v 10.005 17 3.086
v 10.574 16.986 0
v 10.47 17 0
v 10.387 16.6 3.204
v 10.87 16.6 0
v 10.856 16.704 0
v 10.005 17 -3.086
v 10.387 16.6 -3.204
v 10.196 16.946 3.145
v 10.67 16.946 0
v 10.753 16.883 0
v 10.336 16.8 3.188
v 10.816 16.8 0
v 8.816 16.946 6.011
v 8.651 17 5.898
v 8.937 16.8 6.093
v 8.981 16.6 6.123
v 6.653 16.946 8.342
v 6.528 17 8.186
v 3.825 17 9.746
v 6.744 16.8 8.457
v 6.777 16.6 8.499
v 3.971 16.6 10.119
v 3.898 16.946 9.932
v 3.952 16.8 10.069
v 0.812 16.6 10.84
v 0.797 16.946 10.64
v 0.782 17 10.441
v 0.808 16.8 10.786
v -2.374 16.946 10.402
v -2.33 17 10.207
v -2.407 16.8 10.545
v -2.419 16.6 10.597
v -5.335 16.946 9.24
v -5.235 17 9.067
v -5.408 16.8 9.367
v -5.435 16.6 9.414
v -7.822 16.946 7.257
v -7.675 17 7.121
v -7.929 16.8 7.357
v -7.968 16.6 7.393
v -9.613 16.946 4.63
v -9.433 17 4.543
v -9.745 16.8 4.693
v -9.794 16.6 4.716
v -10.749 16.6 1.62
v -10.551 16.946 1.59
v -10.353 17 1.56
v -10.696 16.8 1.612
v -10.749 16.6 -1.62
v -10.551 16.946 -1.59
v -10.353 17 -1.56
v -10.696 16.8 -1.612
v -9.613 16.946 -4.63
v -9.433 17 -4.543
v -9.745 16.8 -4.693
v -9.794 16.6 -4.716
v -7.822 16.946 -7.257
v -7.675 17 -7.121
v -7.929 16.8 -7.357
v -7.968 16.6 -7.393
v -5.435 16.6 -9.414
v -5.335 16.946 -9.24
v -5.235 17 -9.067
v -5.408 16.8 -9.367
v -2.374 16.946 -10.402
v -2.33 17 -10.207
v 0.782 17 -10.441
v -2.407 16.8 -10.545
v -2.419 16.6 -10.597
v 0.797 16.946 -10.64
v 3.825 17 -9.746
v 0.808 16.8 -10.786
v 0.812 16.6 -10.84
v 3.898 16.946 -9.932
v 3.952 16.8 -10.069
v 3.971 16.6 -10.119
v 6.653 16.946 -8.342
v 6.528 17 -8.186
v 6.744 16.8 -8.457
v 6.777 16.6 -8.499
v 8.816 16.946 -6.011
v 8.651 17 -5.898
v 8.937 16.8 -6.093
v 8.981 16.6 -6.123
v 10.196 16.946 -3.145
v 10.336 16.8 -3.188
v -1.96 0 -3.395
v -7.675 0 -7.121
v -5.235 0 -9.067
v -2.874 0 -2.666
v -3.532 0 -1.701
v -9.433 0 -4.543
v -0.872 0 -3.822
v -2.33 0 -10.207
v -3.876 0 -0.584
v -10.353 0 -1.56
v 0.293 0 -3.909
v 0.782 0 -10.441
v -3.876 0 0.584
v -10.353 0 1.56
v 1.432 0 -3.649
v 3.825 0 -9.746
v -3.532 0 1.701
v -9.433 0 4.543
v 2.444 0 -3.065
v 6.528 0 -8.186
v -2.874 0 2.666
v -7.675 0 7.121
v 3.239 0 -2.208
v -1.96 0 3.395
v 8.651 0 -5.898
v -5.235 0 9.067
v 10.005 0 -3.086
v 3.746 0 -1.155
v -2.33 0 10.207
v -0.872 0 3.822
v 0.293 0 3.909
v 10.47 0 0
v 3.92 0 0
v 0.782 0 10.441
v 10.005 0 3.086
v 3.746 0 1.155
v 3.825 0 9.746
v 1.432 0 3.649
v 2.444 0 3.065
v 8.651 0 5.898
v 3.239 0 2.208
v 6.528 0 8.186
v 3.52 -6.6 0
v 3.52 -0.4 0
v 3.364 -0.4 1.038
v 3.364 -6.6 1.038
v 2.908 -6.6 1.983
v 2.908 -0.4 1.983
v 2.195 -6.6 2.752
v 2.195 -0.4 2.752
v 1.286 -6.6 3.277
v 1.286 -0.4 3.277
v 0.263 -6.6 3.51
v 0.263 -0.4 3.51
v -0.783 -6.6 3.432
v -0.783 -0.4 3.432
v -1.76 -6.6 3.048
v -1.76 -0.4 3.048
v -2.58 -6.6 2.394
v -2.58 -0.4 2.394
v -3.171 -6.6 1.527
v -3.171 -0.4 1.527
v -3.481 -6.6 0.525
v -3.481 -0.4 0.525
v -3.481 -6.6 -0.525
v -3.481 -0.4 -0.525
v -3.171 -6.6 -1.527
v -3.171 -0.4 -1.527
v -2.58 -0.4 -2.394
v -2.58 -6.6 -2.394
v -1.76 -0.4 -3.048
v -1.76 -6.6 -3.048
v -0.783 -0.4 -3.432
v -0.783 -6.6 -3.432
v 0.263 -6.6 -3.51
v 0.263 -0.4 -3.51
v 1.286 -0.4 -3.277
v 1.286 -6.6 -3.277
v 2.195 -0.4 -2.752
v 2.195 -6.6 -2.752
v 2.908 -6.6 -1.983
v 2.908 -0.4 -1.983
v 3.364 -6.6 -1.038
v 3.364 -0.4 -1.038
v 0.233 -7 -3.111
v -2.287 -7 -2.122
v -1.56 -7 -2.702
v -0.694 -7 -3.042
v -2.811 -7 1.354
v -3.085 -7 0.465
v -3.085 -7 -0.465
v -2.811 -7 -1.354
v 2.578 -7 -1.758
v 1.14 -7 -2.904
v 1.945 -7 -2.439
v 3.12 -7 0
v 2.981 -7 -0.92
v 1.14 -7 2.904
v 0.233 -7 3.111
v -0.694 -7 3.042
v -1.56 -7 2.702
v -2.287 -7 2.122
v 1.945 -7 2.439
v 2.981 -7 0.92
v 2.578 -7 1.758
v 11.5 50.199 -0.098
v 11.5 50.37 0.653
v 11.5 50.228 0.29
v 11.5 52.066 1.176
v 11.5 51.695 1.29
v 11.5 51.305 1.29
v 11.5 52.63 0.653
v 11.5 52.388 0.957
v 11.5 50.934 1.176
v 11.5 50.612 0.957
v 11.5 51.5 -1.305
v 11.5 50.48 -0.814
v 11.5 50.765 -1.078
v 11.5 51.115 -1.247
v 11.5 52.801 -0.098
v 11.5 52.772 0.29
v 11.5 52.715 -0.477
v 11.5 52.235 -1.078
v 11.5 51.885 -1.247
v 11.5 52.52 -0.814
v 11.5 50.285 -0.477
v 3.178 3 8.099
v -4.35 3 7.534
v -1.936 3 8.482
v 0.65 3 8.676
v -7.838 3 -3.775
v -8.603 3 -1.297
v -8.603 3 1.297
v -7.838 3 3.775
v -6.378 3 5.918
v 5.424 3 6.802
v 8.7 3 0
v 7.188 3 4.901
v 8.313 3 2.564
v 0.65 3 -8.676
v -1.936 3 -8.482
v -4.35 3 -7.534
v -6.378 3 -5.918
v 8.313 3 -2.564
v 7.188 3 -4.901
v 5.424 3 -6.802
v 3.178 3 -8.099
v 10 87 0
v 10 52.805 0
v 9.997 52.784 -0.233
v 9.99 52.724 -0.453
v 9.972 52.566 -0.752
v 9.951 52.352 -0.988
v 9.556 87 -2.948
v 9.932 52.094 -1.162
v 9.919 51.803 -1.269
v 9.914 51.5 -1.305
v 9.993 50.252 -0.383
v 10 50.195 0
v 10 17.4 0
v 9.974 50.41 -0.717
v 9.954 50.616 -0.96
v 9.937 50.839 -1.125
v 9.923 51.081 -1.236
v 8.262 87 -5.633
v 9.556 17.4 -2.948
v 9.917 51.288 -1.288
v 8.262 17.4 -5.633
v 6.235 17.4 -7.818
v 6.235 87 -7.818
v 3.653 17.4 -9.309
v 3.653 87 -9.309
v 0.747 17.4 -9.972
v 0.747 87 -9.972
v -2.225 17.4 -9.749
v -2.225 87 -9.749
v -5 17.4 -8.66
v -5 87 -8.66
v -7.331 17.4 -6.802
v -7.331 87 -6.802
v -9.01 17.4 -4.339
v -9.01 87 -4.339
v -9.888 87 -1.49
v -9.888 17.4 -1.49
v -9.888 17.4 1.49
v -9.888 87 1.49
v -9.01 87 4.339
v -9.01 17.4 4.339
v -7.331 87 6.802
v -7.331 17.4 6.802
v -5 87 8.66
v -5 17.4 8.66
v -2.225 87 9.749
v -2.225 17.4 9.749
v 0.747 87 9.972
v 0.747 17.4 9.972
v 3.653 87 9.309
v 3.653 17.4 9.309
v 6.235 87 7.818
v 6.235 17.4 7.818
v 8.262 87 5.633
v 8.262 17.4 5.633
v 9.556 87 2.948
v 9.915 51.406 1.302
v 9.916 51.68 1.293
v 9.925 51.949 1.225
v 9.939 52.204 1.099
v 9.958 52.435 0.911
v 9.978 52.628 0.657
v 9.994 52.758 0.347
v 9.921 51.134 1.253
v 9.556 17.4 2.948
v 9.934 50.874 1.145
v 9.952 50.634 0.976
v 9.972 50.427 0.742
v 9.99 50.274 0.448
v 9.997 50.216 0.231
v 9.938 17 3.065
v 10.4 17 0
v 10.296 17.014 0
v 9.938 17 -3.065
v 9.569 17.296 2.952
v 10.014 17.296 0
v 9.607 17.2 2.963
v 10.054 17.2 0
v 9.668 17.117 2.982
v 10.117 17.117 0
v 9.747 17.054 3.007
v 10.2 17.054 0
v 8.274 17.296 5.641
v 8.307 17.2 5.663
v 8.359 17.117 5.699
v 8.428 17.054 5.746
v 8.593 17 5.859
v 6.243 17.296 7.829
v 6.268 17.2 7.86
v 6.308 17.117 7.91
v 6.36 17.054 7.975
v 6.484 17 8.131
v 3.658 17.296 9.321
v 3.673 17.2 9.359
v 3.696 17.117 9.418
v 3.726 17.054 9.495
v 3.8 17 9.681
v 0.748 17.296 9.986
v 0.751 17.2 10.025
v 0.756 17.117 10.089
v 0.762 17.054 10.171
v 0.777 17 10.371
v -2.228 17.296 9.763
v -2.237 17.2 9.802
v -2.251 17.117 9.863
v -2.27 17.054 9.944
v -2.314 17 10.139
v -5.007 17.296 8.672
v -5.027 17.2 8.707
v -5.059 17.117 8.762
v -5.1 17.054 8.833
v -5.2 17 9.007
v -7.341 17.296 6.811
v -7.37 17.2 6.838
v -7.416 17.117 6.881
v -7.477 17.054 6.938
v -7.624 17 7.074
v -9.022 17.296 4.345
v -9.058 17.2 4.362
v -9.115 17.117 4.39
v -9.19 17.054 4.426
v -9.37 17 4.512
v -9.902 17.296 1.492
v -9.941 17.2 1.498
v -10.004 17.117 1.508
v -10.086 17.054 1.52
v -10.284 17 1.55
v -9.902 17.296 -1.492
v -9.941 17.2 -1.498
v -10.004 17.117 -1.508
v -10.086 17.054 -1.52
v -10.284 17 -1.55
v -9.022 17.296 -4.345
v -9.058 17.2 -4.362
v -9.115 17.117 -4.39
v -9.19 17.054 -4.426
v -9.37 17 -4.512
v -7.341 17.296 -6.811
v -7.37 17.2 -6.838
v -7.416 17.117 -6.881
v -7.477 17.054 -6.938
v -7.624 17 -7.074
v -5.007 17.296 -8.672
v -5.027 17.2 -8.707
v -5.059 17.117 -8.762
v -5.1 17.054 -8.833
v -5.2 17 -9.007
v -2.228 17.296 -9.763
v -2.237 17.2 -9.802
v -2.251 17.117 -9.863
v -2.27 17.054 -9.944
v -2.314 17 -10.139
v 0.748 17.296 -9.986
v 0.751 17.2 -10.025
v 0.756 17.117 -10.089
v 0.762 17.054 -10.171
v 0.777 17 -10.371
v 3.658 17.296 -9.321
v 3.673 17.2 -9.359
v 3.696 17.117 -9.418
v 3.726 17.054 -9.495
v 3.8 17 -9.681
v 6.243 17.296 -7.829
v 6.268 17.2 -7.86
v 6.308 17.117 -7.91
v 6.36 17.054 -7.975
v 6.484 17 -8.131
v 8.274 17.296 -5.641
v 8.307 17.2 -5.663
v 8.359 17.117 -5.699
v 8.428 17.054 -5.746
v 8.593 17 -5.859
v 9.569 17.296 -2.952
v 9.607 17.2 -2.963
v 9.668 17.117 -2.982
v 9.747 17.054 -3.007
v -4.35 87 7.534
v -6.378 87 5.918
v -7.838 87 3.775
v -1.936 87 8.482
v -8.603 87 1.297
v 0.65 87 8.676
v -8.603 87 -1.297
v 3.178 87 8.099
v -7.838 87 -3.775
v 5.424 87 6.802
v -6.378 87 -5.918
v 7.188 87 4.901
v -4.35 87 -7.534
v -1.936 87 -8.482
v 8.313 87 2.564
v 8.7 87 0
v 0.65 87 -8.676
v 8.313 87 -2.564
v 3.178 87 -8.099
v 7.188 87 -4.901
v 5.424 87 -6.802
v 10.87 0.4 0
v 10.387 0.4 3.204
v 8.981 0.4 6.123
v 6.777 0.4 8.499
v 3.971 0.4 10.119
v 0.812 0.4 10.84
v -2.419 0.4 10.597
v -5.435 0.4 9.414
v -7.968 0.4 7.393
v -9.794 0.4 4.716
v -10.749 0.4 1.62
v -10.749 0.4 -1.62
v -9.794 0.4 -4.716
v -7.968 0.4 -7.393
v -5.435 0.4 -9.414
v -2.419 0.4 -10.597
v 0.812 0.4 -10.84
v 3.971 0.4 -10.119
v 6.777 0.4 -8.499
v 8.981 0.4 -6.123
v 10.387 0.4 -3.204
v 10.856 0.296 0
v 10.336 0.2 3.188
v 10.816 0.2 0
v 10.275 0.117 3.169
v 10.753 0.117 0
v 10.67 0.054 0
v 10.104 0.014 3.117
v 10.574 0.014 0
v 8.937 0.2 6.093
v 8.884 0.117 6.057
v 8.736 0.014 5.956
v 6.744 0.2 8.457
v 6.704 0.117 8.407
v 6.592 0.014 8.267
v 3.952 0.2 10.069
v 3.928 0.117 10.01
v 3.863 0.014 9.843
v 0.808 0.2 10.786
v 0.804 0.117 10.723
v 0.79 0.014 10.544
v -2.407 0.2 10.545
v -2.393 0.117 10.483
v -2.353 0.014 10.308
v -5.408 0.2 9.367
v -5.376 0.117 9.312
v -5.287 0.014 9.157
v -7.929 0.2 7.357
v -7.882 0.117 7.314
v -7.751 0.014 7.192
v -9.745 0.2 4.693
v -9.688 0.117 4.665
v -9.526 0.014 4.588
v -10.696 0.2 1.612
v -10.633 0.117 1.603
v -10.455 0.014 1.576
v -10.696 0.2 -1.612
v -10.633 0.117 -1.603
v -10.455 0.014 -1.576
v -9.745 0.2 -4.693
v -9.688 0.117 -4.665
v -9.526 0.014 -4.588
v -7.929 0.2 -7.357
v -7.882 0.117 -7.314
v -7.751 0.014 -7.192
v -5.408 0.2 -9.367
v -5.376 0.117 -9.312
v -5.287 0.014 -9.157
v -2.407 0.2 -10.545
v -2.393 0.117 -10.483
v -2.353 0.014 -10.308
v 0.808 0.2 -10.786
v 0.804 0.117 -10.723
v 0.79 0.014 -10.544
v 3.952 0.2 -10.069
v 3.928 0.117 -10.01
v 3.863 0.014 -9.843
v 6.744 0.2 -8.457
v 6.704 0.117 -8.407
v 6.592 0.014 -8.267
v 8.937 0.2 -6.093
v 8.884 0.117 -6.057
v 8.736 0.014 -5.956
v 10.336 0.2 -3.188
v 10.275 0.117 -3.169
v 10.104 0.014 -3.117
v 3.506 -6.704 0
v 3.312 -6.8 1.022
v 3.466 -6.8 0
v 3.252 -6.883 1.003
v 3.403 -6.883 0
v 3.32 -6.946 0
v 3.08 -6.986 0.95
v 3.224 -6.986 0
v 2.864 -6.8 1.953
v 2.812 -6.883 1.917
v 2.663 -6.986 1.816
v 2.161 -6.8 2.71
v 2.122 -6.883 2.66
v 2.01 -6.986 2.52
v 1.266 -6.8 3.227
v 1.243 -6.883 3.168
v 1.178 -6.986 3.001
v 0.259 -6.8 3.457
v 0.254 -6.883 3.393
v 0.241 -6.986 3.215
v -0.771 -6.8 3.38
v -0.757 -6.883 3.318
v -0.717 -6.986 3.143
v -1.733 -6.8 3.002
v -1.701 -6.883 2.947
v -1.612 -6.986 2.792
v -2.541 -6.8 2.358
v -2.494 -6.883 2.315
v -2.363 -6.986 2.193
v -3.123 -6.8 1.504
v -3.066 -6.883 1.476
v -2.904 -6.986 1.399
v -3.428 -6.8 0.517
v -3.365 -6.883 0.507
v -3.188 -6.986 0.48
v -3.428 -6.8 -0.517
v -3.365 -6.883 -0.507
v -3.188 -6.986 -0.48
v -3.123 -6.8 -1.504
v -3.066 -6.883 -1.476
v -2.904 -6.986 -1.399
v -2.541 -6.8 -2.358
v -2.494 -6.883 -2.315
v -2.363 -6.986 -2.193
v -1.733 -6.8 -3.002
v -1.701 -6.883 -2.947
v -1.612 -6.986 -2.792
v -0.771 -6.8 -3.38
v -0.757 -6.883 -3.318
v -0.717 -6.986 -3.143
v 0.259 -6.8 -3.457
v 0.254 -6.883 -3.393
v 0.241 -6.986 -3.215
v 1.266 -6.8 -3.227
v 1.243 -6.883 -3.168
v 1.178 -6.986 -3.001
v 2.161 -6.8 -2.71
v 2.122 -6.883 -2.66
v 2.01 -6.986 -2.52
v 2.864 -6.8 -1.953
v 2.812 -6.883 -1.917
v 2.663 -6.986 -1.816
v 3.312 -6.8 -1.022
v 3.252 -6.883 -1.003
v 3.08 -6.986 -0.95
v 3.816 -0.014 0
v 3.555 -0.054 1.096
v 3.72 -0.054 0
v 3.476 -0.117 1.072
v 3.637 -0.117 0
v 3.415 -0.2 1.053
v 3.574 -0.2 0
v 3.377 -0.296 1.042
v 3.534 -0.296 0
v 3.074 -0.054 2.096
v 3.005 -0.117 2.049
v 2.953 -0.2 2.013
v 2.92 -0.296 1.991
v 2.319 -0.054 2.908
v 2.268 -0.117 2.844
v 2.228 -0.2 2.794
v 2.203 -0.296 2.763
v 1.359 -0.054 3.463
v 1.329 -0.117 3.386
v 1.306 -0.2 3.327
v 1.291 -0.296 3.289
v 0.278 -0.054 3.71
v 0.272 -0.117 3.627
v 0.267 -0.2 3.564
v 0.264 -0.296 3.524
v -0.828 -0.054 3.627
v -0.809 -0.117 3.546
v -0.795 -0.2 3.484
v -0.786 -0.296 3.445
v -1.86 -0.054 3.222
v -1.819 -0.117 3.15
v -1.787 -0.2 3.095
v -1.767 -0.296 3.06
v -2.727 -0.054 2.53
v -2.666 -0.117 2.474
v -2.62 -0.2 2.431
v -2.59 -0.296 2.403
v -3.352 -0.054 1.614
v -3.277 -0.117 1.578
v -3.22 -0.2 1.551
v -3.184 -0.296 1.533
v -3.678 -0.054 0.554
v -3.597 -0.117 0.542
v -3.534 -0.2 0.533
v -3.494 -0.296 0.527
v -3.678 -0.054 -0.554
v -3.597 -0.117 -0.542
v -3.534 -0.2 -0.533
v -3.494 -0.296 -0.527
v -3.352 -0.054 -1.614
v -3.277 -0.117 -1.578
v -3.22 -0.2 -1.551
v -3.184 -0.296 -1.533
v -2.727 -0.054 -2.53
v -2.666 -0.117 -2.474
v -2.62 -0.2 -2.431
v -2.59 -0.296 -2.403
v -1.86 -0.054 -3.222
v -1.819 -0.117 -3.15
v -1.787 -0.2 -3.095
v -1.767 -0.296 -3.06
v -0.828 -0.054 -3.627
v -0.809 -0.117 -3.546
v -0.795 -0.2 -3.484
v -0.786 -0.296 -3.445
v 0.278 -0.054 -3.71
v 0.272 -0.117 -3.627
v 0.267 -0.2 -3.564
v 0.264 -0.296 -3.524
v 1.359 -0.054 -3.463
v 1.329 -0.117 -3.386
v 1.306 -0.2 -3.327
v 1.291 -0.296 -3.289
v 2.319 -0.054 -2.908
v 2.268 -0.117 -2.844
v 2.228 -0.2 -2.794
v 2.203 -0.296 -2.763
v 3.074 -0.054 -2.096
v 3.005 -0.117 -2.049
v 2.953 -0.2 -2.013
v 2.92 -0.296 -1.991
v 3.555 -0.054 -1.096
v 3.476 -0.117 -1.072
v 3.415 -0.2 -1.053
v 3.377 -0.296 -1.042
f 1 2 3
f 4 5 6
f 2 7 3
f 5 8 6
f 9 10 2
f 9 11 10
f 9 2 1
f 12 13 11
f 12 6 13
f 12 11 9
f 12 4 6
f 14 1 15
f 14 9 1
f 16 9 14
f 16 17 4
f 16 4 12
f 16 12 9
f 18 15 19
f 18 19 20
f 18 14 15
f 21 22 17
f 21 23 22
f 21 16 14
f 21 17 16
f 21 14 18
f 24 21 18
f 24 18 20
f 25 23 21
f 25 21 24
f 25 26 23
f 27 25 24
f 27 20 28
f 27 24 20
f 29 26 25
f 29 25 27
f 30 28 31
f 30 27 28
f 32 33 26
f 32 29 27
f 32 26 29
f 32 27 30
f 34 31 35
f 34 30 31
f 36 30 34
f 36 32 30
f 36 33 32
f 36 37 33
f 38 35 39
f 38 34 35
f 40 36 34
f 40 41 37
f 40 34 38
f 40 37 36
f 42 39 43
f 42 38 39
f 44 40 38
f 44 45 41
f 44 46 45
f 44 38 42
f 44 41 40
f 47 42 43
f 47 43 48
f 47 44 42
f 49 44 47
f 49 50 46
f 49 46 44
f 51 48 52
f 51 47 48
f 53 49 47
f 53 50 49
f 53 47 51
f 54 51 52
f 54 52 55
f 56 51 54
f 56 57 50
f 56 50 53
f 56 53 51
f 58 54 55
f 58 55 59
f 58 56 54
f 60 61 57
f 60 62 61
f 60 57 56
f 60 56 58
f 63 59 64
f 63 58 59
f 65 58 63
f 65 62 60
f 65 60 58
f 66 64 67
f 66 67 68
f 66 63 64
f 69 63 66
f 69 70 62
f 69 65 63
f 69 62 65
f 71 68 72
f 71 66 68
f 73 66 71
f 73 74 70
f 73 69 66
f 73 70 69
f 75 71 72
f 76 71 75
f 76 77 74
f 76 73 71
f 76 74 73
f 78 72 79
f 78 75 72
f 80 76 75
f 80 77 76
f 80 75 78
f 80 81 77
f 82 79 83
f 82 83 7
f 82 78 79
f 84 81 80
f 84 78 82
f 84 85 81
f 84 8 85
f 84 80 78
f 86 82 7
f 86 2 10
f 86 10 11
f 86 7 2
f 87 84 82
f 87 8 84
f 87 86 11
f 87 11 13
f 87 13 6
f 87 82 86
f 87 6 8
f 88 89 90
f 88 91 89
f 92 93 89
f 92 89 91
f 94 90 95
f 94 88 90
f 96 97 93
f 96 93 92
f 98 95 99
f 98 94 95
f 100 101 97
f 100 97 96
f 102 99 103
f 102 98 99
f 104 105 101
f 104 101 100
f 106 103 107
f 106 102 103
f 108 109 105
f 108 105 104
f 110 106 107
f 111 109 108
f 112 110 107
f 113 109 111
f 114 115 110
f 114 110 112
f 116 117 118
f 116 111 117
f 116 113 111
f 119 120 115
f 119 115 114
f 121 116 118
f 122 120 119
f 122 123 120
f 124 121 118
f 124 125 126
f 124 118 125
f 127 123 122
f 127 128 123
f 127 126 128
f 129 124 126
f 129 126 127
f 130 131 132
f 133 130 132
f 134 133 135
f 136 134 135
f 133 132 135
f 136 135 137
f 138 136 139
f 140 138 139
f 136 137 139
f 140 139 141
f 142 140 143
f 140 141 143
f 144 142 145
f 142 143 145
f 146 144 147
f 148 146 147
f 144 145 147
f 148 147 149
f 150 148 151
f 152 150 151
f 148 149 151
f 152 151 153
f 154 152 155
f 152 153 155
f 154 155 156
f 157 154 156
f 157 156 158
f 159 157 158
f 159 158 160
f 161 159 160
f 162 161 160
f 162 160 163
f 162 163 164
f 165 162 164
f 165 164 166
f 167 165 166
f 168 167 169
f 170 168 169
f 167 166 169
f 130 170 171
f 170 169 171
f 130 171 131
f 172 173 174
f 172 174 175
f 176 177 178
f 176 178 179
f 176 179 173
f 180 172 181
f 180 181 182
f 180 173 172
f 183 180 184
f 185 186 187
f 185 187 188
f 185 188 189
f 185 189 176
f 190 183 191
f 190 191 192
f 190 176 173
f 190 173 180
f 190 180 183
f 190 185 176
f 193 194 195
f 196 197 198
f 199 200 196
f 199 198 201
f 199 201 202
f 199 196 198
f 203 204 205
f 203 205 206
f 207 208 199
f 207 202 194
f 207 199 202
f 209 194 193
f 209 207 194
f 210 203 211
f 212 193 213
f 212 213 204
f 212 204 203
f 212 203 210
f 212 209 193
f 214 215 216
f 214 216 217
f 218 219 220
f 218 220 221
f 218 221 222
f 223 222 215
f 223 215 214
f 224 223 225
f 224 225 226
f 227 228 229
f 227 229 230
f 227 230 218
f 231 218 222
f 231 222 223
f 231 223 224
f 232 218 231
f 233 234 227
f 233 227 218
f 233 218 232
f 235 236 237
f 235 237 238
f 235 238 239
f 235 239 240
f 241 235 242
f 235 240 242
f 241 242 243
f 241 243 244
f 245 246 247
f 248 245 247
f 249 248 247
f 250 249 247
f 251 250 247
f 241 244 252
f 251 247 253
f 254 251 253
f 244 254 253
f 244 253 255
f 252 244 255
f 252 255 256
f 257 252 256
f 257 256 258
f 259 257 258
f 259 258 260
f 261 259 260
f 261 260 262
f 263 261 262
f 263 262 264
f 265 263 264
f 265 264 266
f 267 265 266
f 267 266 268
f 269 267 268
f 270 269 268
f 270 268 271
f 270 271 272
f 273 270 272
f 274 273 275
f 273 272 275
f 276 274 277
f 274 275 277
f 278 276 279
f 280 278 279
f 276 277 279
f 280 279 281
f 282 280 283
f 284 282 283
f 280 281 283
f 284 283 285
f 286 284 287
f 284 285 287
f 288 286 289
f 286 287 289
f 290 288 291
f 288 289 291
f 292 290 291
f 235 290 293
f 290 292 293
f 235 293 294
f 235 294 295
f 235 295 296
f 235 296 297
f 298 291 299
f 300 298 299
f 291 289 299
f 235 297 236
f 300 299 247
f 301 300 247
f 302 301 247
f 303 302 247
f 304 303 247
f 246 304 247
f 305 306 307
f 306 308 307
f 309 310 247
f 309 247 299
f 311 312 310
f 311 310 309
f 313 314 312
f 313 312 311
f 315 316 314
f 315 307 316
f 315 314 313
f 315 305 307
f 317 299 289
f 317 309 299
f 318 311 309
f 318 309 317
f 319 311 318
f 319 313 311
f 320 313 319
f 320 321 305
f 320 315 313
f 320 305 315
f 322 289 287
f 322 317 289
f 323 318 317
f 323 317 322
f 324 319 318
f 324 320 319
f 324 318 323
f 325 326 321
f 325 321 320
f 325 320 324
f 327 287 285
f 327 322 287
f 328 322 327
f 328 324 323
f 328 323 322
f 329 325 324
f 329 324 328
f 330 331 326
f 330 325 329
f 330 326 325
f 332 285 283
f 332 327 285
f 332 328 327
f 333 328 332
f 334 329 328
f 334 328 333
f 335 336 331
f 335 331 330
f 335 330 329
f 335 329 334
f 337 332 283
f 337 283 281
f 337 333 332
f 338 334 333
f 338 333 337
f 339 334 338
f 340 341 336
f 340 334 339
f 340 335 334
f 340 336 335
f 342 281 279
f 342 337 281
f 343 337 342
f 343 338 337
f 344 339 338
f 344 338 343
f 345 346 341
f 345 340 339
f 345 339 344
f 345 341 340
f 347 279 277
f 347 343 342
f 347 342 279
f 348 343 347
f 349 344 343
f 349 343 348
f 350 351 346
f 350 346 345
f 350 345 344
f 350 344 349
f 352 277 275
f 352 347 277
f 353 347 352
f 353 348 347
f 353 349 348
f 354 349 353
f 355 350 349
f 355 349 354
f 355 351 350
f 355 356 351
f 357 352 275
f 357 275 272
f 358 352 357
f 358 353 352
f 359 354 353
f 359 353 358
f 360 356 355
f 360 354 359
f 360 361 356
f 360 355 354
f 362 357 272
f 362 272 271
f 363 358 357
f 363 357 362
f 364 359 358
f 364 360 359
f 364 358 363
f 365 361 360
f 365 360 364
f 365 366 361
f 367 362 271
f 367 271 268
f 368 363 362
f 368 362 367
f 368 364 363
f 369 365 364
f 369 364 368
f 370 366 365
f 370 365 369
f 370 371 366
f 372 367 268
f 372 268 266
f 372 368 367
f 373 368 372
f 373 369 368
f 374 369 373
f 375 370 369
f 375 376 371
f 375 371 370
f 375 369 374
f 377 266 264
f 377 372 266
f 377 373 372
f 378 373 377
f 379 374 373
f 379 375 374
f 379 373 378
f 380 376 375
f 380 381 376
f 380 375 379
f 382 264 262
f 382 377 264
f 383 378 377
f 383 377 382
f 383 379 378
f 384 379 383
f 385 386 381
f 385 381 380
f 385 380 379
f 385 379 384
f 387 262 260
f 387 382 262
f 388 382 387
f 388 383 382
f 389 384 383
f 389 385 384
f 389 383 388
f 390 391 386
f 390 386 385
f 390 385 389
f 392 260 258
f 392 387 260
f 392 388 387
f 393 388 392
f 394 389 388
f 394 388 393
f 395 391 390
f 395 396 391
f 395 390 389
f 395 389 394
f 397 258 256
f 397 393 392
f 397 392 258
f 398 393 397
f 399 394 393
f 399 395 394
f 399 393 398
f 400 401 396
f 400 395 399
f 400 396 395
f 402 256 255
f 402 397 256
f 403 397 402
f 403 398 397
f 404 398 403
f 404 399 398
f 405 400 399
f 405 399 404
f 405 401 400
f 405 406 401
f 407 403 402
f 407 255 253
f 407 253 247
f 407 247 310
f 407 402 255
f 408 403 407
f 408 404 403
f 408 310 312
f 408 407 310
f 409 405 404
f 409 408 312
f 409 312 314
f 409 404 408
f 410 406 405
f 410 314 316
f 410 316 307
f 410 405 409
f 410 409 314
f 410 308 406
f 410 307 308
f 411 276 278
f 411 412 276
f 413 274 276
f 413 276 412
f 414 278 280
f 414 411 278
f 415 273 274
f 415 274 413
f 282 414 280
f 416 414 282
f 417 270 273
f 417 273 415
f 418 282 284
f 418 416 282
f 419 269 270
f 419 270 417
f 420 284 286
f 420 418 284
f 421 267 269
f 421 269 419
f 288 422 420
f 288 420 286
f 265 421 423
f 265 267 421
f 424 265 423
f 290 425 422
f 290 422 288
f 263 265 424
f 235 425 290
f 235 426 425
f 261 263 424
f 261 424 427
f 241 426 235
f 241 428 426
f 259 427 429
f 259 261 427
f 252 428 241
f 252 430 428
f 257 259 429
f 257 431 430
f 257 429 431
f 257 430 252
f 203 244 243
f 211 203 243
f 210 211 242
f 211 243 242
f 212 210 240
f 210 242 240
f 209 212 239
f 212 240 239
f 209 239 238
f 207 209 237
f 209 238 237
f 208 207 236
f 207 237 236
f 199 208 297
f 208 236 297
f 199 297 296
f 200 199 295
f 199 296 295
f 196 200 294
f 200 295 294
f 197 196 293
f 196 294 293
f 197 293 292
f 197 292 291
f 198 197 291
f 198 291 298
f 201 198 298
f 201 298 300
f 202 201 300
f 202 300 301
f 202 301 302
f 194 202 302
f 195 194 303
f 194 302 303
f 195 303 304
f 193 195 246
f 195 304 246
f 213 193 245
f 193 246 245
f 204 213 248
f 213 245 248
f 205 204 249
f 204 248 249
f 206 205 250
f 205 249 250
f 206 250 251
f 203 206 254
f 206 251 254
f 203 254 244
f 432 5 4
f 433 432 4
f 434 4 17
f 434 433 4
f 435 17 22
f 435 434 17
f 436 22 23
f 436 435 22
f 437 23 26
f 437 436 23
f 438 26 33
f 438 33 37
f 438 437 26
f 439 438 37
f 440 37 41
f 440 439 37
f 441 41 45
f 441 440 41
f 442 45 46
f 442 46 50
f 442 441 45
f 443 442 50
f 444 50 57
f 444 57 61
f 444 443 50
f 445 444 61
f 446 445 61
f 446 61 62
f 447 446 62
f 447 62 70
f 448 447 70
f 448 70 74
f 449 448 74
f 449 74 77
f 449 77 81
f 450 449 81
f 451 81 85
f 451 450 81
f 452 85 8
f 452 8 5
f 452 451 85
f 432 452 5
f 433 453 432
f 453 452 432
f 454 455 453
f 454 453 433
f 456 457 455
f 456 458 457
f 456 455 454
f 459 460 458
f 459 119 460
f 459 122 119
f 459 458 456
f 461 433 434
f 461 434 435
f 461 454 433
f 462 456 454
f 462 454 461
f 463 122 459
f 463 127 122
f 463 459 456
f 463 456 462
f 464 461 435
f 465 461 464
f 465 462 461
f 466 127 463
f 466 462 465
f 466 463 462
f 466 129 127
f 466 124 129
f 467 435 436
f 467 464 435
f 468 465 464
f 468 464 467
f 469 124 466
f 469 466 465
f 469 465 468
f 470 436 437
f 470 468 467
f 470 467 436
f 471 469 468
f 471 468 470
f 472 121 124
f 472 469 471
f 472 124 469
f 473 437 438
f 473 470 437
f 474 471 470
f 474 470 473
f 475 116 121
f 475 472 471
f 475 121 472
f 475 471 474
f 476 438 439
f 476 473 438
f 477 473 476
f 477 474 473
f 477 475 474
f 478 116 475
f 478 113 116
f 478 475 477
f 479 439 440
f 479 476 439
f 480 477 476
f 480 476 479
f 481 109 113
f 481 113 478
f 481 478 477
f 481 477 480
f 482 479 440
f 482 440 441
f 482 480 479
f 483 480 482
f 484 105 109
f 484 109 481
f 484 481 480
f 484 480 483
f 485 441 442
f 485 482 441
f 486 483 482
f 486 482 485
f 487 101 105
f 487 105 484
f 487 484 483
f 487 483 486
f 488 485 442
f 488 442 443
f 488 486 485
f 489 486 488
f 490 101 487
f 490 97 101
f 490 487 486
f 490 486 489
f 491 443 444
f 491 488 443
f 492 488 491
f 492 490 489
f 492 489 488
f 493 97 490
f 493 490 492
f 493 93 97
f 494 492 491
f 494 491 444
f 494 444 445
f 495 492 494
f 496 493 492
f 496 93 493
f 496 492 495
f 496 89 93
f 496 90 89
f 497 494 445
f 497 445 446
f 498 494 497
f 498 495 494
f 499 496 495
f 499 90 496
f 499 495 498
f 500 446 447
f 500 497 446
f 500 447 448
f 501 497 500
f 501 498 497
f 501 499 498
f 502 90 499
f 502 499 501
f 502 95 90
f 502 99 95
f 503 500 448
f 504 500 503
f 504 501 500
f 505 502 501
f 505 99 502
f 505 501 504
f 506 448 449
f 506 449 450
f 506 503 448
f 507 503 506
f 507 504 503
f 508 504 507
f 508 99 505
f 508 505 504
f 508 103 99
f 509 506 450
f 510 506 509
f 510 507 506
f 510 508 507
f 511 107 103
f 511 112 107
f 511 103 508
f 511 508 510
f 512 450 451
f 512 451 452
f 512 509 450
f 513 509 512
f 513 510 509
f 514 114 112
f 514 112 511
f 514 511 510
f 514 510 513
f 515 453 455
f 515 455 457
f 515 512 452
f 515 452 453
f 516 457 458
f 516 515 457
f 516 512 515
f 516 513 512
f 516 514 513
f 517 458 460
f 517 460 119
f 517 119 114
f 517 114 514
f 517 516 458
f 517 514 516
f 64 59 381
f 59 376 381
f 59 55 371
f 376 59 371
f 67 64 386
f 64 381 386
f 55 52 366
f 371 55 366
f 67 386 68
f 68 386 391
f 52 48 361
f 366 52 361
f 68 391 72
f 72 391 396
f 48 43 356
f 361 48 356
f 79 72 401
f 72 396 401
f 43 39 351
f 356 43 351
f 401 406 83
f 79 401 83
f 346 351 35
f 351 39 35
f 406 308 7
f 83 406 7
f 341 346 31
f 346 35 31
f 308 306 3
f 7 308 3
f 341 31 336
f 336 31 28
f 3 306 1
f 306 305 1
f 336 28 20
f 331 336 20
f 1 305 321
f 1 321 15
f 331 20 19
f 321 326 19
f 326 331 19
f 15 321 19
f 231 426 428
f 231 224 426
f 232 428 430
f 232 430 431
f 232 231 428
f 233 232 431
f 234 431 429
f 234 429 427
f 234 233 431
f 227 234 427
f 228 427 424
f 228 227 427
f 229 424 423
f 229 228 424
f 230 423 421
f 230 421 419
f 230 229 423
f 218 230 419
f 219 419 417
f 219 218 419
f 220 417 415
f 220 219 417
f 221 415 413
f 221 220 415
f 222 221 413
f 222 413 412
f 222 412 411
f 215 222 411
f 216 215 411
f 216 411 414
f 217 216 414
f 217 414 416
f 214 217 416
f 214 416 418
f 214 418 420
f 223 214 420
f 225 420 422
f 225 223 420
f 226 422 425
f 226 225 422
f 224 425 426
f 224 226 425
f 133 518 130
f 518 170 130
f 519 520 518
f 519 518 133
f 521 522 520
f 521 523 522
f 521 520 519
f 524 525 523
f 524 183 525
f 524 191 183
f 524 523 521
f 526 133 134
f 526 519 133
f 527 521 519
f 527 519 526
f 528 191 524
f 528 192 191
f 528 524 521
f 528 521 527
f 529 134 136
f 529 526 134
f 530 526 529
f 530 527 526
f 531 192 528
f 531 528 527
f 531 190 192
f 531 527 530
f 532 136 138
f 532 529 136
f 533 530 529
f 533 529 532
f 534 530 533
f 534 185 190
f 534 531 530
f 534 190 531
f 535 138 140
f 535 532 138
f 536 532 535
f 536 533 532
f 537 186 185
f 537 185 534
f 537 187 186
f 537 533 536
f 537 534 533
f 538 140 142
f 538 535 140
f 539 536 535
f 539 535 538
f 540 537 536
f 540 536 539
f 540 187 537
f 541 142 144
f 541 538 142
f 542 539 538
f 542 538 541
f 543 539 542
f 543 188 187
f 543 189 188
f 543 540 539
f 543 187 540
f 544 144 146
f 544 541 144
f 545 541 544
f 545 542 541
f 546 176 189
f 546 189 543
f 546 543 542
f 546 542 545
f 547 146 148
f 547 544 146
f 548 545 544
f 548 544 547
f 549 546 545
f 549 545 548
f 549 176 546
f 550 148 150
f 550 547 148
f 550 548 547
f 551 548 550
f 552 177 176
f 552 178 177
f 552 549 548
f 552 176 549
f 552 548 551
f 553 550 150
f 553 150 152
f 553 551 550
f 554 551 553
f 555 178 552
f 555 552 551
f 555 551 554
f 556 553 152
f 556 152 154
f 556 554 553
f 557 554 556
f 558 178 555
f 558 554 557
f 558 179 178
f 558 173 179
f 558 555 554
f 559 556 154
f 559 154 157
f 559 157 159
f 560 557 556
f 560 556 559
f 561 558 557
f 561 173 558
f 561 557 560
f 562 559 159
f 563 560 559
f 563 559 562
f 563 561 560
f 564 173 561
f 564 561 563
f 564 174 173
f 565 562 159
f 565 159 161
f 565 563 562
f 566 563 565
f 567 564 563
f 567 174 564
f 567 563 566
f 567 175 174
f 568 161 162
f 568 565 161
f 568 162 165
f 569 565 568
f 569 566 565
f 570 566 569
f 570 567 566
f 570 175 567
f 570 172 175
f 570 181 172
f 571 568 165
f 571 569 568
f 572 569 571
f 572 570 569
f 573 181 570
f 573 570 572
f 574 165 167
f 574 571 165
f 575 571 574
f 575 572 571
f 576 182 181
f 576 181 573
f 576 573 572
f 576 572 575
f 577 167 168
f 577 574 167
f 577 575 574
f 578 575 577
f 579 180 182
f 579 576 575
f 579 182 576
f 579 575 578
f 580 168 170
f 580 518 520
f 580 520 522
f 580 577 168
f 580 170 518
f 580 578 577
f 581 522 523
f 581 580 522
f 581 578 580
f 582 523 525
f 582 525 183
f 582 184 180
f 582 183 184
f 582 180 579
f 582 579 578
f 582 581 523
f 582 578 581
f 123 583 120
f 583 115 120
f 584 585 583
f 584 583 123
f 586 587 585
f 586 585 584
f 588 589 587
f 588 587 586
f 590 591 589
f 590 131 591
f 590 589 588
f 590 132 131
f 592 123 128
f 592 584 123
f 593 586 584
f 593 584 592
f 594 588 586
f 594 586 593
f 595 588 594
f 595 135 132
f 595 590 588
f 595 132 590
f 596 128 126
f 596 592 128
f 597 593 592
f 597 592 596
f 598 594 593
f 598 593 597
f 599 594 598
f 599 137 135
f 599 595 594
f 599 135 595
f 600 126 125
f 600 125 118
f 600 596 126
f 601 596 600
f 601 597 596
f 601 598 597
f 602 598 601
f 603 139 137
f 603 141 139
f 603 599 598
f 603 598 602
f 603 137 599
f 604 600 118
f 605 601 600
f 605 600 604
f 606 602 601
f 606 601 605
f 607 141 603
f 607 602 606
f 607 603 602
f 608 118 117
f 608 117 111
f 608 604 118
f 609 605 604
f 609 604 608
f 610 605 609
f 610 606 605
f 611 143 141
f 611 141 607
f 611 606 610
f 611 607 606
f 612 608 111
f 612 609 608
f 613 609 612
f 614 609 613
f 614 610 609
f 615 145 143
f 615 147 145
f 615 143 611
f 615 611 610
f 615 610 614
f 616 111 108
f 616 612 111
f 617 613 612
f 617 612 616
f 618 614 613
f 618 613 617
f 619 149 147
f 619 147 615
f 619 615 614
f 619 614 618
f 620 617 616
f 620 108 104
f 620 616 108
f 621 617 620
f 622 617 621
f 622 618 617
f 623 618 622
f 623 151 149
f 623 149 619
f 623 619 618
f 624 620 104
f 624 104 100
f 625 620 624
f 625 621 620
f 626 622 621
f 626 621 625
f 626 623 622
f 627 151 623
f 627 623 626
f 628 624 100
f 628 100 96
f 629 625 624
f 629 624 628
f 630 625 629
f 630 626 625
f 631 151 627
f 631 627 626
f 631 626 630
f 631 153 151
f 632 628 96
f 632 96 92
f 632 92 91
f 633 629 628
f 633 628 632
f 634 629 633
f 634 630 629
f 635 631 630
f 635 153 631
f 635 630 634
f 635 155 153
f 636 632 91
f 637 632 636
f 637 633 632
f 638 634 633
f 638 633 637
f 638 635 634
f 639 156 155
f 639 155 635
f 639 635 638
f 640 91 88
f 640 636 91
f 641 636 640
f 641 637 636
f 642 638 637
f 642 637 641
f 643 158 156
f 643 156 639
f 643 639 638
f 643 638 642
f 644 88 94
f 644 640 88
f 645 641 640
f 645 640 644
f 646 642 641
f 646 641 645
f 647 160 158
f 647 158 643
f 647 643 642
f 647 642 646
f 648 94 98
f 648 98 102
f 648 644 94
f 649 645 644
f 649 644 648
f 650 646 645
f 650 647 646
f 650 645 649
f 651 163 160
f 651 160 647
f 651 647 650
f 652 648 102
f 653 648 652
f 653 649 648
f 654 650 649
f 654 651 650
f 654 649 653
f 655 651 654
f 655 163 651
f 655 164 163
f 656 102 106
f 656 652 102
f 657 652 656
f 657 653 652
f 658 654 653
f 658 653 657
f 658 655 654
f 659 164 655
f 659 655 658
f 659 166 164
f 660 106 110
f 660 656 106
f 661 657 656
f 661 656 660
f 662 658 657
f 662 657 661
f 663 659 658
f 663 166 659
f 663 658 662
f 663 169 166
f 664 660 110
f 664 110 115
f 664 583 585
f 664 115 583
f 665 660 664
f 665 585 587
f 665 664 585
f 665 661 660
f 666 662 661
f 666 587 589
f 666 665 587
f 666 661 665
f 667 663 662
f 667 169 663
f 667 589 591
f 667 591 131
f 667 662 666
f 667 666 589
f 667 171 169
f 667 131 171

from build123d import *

# Parameters (mm, degrees)
SKETCH1_R           = 10
SKETCH1_R_2         = 8.7
BOSS_EXTRUDE1_DEPTH = 87
SKETCH2_R           = 10.87
BOSS_EXTRUDE2_DEPTH = 17
SKETCH3_R           = 3.52
BOSS_EXTRUDE3_DEPTH = 7
SKETCH4_R           = 8.7
CUT_EXTRUDE1_DEPTH  = 14
BOSS_EXTRUDE4_START = -0.085517
SKETCH5_R           = 1.305
BOSS_EXTRUDE4_DEPTH = 1.585517
FILLET1_R           = 0.4


with BuildPart() as part:
    # Sketch1 → Boss-Extrude1 (new body)
    with BuildSketch(Plane(origin=(0, 0, 0), x_dir=(1, 0, 0), z_dir=(0, 1, 0))):
        Circle(SKETCH1_R)
        Circle(SKETCH1_R_2, mode=Mode.SUBTRACT)
    extrude(amount=BOSS_EXTRUDE1_DEPTH)

    # Sketch2 → Boss-Extrude2 (add)
    with BuildSketch(Plane.XZ):
        Circle(SKETCH2_R)
    extrude(amount=-BOSS_EXTRUDE2_DEPTH)

    # Sketch3 → Boss-Extrude3 (add)
    with BuildSketch(Plane.XZ):
        Circle(SKETCH3_R)
    extrude(amount=BOSS_EXTRUDE3_DEPTH)

    # Sketch4 → Cut-Extrude1 (cut)
    with BuildSketch(Plane(origin=(0, 17, 0), x_dir=(1, 0, 0), z_dir=(0, 1, 0))):
        Circle(SKETCH4_R)
    extrude(amount=-CUT_EXTRUDE1_DEPTH, mode=Mode.SUBTRACT)

    # Sketch5 → Boss-Extrude4 (add)
    with BuildSketch(Plane(origin=(10, 0, 0), x_dir=(0, 0, -1), z_dir=(1, 0, 0)).offset(BOSS_EXTRUDE4_START)):
        with Locations((0, 51.5)):
            Circle(SKETCH5_R)
    extrude(amount=BOSS_EXTRUDE4_DEPTH)

    # Fillet1
    fillet1_edges = [part.edges().sort_by_distance(p)[0] for p in [
        (-10, 17, 0),
        (-10.87, 17, 0),
        (-10.87, 0, 0),
        (-3.52, 0, 0),
        (-3.52, -7, 0),
    ]]
    fillet(fillet1_edges, radius=FILLET1_R)


solid = part.part
